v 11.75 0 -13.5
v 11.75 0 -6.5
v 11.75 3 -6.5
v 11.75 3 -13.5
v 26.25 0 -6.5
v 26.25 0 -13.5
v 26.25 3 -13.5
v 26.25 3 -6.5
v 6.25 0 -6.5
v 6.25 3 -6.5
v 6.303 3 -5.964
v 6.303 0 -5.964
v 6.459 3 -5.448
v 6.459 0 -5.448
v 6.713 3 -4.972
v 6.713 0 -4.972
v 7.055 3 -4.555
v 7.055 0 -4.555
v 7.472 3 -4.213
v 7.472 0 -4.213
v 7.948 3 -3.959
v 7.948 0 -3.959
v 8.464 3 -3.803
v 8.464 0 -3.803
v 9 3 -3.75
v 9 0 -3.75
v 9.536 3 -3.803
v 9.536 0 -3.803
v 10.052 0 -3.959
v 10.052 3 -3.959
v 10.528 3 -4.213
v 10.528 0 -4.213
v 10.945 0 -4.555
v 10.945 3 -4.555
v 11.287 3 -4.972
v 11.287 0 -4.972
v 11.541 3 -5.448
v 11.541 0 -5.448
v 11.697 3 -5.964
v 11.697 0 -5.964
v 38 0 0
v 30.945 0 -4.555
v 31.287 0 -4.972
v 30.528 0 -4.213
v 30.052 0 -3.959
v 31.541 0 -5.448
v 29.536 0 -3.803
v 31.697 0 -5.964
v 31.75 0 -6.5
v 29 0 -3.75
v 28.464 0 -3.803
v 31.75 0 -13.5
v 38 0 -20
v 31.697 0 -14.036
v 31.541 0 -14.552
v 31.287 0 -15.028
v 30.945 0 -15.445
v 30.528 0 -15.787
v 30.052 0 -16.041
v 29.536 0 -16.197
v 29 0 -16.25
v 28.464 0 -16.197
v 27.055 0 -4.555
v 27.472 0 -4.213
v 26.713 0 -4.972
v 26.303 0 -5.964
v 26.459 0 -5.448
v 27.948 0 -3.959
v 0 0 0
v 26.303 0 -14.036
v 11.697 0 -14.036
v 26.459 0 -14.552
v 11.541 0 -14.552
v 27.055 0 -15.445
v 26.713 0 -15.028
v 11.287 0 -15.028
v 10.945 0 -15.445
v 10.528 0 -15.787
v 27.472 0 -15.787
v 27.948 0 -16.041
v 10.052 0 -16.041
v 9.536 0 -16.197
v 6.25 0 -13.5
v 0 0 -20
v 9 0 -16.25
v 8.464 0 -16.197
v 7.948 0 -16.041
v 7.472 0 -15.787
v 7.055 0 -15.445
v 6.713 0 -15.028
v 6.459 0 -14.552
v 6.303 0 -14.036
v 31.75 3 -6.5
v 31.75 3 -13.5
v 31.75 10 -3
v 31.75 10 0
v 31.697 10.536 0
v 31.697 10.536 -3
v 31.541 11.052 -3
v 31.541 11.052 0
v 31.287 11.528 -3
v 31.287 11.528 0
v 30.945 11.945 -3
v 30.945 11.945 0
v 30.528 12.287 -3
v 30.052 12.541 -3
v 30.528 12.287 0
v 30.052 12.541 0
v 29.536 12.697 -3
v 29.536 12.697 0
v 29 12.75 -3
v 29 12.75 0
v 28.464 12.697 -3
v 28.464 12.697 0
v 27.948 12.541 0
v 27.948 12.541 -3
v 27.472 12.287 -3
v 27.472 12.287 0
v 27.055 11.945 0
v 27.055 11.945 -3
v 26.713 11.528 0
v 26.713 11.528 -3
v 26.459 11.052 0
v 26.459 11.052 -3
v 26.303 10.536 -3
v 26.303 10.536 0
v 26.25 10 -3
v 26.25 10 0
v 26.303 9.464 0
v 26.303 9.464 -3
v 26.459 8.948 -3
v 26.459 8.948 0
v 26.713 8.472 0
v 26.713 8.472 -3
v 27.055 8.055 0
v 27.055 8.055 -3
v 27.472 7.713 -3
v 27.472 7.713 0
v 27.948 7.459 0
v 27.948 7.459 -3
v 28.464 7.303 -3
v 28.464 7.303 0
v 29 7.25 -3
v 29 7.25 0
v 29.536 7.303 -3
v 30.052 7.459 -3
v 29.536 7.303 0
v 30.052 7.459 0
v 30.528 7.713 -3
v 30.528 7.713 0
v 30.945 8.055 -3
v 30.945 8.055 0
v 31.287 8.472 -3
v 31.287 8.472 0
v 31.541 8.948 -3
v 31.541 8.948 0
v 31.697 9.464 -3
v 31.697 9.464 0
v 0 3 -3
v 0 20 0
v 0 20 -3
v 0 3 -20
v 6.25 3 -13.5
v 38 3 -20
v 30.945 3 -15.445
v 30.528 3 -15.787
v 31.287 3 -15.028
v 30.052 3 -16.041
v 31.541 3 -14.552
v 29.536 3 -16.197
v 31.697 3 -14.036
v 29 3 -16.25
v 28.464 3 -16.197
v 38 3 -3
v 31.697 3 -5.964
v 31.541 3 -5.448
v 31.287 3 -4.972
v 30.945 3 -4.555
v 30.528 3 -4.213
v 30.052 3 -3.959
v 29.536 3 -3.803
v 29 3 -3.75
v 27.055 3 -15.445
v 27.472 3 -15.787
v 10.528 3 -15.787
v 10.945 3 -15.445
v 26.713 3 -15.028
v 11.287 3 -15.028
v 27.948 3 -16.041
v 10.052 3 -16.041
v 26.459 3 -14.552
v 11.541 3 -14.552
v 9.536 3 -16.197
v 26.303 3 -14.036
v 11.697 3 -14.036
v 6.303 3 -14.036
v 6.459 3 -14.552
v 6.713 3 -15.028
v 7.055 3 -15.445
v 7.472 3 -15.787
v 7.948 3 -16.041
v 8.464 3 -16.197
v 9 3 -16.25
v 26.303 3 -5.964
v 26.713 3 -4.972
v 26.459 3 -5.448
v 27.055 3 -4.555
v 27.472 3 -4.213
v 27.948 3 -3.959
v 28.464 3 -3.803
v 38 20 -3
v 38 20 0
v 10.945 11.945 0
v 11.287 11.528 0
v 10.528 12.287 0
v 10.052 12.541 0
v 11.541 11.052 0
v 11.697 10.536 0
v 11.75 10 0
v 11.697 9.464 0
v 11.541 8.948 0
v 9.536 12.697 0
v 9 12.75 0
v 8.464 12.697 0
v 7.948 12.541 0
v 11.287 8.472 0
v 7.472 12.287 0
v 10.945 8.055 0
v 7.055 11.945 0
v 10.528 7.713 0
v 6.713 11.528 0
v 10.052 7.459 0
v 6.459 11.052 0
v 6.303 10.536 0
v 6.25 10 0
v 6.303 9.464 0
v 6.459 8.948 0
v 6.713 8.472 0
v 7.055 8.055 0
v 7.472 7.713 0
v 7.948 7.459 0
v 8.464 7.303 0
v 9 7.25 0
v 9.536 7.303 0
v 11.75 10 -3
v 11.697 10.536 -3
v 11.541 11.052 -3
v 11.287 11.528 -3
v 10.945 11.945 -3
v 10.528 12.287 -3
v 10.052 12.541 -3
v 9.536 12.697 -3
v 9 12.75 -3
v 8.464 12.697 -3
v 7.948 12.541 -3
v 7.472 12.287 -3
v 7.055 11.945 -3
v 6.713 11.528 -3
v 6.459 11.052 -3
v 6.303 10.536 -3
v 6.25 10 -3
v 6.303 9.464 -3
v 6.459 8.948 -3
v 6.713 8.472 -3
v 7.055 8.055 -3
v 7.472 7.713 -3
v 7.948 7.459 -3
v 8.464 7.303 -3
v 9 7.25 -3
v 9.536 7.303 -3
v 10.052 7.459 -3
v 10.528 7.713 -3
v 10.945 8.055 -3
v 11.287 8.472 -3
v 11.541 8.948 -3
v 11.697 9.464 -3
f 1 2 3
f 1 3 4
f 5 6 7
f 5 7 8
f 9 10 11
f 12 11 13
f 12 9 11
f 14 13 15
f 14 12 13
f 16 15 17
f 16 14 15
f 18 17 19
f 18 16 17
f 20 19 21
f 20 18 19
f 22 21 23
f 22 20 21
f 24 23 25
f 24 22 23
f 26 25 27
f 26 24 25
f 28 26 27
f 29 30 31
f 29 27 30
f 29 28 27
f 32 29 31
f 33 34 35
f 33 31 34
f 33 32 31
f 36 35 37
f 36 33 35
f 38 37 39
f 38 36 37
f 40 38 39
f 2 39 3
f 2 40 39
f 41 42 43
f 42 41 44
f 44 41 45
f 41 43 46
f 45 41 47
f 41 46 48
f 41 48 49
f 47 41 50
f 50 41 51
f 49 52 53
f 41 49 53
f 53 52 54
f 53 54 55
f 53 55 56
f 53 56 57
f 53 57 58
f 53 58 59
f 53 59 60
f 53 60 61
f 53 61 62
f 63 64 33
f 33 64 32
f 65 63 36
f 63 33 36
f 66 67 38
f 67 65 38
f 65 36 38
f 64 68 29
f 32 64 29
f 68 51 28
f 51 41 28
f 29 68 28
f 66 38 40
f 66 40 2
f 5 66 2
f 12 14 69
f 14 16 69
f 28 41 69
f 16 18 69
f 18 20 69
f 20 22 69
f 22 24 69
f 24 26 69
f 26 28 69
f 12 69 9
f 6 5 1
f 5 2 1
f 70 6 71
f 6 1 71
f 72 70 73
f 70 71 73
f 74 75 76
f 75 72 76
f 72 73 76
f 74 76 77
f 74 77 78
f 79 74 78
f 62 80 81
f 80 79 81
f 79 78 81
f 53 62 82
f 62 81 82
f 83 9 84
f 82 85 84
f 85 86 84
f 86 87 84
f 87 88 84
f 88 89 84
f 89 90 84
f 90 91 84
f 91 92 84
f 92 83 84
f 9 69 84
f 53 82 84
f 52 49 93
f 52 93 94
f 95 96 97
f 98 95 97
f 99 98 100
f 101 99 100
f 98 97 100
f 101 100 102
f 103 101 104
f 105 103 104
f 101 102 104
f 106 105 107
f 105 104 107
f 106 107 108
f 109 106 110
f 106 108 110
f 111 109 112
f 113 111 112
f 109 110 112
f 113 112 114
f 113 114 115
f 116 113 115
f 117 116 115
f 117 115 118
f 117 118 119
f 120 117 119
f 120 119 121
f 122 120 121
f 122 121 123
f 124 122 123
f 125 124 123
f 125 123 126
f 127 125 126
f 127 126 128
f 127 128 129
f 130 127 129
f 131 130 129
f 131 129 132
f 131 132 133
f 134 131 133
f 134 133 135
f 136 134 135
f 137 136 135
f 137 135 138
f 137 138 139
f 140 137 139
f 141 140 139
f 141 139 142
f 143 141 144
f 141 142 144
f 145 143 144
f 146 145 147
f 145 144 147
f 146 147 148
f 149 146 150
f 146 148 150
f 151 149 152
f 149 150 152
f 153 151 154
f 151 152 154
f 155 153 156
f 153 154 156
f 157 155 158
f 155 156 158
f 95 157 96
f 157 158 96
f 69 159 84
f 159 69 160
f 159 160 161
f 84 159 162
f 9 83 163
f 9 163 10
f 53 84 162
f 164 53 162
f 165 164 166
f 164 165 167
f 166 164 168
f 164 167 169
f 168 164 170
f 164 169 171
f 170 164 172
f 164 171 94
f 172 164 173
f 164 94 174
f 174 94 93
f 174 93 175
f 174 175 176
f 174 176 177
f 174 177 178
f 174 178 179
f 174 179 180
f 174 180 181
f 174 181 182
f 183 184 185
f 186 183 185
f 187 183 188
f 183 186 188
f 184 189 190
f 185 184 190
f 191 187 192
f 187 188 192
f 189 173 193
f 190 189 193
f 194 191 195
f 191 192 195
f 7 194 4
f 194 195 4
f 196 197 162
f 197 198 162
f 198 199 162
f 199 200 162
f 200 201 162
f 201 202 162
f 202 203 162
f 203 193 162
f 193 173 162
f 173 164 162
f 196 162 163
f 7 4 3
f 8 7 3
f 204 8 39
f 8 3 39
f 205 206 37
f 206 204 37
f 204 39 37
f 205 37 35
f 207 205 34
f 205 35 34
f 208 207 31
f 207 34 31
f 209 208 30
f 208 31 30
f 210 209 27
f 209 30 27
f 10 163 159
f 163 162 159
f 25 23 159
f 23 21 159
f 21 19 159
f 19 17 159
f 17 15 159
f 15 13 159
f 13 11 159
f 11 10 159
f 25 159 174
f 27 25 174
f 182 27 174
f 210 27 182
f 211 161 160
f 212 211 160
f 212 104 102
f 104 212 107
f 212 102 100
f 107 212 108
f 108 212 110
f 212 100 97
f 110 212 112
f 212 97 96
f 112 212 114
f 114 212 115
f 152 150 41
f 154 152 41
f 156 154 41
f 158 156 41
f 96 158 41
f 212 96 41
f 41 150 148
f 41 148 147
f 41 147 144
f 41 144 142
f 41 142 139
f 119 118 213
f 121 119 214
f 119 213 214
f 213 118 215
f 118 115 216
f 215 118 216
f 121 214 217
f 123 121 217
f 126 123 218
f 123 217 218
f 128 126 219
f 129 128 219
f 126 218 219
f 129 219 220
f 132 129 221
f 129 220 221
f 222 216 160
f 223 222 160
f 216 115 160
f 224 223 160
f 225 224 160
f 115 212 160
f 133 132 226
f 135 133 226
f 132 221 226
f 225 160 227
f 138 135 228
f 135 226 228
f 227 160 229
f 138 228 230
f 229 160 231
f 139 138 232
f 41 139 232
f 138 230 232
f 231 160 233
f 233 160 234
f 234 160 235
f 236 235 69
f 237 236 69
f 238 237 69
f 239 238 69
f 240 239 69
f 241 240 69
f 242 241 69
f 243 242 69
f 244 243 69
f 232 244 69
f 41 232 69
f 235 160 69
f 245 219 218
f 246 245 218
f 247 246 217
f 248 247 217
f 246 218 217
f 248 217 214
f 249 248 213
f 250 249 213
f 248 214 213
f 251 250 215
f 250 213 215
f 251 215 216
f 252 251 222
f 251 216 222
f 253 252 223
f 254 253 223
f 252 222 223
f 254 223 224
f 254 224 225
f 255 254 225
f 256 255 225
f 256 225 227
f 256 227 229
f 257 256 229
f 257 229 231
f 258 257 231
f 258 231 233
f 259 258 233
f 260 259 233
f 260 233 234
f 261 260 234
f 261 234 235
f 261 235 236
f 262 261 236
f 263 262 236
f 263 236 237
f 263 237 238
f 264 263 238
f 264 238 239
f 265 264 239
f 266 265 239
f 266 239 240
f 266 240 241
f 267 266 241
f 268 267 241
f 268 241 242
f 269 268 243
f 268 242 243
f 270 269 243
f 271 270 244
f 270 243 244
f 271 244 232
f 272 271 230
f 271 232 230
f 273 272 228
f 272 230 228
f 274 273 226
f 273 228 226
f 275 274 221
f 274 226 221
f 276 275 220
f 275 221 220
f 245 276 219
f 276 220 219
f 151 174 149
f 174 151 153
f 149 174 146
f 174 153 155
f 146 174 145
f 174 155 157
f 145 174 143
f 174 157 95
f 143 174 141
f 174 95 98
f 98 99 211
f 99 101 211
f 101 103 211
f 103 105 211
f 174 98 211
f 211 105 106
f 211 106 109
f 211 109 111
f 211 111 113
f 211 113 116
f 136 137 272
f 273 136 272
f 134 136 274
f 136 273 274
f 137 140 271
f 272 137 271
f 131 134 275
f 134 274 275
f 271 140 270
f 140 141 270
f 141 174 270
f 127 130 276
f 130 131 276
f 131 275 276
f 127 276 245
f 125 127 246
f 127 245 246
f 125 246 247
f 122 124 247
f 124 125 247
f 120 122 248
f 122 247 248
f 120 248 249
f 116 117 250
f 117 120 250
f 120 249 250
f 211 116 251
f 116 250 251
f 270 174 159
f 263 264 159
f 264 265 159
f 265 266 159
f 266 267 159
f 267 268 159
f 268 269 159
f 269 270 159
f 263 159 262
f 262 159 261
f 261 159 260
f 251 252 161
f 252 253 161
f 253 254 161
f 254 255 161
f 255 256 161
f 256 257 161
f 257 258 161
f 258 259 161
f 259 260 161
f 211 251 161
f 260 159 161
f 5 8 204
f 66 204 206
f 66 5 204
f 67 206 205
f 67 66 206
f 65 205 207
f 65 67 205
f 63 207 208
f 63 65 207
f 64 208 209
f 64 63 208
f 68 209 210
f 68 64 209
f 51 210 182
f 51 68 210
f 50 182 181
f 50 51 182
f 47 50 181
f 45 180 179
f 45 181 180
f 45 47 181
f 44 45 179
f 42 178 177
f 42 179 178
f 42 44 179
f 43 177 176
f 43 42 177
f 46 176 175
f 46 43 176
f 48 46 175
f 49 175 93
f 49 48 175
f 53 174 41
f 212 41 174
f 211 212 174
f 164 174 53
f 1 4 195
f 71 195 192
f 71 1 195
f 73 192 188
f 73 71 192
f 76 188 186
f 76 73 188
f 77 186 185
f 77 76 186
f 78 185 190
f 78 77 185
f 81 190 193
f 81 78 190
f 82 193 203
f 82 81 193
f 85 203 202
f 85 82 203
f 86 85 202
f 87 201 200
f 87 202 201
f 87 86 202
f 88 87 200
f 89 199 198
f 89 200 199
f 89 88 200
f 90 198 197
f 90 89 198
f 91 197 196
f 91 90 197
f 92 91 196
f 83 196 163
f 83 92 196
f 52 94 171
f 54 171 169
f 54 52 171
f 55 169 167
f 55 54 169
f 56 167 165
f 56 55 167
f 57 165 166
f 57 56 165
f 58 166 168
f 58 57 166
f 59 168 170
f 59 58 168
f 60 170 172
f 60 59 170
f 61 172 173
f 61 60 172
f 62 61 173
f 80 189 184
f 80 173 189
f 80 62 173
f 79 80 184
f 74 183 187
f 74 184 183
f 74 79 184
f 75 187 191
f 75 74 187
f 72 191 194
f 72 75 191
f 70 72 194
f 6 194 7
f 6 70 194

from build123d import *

# Parameters (mm, degrees)
EXTRUDE_1_DEPTH     = 38
SKETCH_2_R          = 2.75
CUT_EXTRUDE_1_DEPTH = 21
CUT_EXTRUDE_2_DEPTH = 21


with BuildPart() as part:
    # 草图1 → 凸台-拉伸1 (new body)
    with BuildSketch(Plane(origin=(0, 0, 0), x_dir=(0, 0, -1), z_dir=(1, 0, 0))):
        Polygon((0, 0), (20, 0), (20, 3), (3, 3), (3, 20), (0, 20), align=None)
    extrude(amount=EXTRUDE_1_DEPTH)

    # 草图2 → 切除-拉伸1 (cut, through all)
    with BuildSketch(Plane.XY):
        with Locations((9, 10)):
            Circle(SKETCH_2_R)
        with Locations((29, 10)):
            Circle(SKETCH_2_R)
    extrude(amount=-CUT_EXTRUDE_1_DEPTH, mode=Mode.SUBTRACT)

    # 草图3 → 切除-拉伸2 (cut, through all)
    with BuildSketch(Plane.XZ):
        with BuildLine():
            Line((6.25, -13.5), (6.25, -6.5))
            ThreePointArc((6.25, -6.5), (9, -3.75), (11.75, -6.5))
            Line((11.75, -6.5), (11.75, -13.5))
            ThreePointArc((11.75, -13.5), (9, -16.25), (6.25, -13.5))
        make_face()
        with BuildLine():
            Line((26.25, -13.5), (26.25, -6.5))
            ThreePointArc((26.25, -6.5), (29, -3.75), (31.75, -6.5))
            Line((31.75, -6.5), (31.75, -13.5))
            ThreePointArc((31.75, -13.5), (29, -16.25), (26.25, -13.5))
        make_face()
    extrude(amount=-CUT_EXTRUDE_2_DEPTH, mode=Mode.SUBTRACT)


solid = part.part
